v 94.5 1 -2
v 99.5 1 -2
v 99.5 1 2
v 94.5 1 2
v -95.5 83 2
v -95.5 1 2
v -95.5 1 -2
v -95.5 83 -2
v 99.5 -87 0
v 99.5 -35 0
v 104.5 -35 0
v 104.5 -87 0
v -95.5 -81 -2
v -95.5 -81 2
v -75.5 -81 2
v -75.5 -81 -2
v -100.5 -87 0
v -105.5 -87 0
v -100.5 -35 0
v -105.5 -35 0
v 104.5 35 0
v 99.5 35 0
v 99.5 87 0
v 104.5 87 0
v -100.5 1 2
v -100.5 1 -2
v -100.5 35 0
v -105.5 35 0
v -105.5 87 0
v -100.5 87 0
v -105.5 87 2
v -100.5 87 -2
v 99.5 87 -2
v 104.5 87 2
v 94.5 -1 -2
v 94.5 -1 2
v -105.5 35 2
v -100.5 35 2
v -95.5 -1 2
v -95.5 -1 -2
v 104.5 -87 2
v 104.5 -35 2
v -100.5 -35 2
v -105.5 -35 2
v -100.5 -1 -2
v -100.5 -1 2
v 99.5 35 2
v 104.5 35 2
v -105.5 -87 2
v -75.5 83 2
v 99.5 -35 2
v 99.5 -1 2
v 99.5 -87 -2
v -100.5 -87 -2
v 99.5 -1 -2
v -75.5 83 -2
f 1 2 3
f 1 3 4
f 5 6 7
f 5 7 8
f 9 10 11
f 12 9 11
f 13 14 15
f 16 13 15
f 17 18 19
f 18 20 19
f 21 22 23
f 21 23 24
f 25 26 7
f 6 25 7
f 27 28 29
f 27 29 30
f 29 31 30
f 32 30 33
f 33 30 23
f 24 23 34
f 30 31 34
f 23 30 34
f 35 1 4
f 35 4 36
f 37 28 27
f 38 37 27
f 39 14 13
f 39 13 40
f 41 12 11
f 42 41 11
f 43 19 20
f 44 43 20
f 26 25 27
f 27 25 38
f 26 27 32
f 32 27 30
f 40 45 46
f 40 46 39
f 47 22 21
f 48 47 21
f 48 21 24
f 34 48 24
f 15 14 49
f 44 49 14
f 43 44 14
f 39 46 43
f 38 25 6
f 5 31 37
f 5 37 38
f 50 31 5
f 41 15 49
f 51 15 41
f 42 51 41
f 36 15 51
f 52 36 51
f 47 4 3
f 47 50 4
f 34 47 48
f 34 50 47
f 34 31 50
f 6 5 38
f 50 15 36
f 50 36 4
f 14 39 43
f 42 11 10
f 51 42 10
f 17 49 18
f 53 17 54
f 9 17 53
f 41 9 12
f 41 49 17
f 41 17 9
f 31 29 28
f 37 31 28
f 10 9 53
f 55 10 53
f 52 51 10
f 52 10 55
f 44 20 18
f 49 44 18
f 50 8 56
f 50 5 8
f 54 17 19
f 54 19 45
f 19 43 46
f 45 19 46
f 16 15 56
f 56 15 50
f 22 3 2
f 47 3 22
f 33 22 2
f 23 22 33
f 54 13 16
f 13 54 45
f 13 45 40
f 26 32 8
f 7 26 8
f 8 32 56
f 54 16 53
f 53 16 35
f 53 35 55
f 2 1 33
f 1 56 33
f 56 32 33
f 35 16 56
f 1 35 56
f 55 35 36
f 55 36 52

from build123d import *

# Parameters (mm, degrees)
EXTRUDE_1_DEPTH          = 2
SKETCH_2_W               = 200
SKETCH_2_H               = 174
SKETCH_2_W_2             = 20
SKETCH_2_H_2             = 164
EXTRUDE_2_DEPTH          = 2
CUT_EXTRUDE_1_DEPTH      = 137.759825972
CUT_EXTRUDE_1_DEPTH_BACK = 137.759825972
SKETCH_3_W               = 5
SKETCH_3_H               = 2


with BuildPart() as part:
    # 草图1 → 凸台-拉伸1 (new body)
    with BuildSketch(Plane.XY):
        Polygon((104.5, 35), (104.5, 87), (-105.5, 87), (-105.5, 35), (-100.5, 35), (-100.5, -35), (-105.5, -35), (-105.5, -87), (104.5, -87), (104.5, -35), (99.5, -35), (99.5, 35), align=None)
        Polygon((-95.5, 35), (-95.5, 83), (-75.5, 83), (-75.5, -81), (-95.5, -81), align=None, mode=Mode.SUBTRACT)
    extrude(amount=EXTRUDE_1_DEPTH)

    # 草图2 → 凸台-拉伸2 (add)
    with BuildSketch(Plane.XY):
        with Locations((-0.5, 0)):
            Rectangle(SKETCH_2_W, SKETCH_2_H)
        with Locations((-85.5, 1)):
            Rectangle(SKETCH_2_W_2, SKETCH_2_H_2, mode=Mode.SUBTRACT)
    extrude(amount=-EXTRUDE_2_DEPTH)

    # 草图3 → 切除-拉伸1 (cut, two sides: drawn at the far end of the back side and taken through both)
    with BuildSketch(Plane.XY.offset(-CUT_EXTRUDE_1_DEPTH_BACK)):
        with Locations((-98, 0)):
            Rectangle(SKETCH_3_W, SKETCH_3_H)
        Polygon((99.5, 0), (99.5, 1), (94.5, 1), (94.5, -1), (99.5, -1), align=None)
    extrude(amount=CUT_EXTRUDE_1_DEPTH + CUT_EXTRUDE_1_DEPTH_BACK, mode=Mode.SUBTRACT)


solid = part.part
